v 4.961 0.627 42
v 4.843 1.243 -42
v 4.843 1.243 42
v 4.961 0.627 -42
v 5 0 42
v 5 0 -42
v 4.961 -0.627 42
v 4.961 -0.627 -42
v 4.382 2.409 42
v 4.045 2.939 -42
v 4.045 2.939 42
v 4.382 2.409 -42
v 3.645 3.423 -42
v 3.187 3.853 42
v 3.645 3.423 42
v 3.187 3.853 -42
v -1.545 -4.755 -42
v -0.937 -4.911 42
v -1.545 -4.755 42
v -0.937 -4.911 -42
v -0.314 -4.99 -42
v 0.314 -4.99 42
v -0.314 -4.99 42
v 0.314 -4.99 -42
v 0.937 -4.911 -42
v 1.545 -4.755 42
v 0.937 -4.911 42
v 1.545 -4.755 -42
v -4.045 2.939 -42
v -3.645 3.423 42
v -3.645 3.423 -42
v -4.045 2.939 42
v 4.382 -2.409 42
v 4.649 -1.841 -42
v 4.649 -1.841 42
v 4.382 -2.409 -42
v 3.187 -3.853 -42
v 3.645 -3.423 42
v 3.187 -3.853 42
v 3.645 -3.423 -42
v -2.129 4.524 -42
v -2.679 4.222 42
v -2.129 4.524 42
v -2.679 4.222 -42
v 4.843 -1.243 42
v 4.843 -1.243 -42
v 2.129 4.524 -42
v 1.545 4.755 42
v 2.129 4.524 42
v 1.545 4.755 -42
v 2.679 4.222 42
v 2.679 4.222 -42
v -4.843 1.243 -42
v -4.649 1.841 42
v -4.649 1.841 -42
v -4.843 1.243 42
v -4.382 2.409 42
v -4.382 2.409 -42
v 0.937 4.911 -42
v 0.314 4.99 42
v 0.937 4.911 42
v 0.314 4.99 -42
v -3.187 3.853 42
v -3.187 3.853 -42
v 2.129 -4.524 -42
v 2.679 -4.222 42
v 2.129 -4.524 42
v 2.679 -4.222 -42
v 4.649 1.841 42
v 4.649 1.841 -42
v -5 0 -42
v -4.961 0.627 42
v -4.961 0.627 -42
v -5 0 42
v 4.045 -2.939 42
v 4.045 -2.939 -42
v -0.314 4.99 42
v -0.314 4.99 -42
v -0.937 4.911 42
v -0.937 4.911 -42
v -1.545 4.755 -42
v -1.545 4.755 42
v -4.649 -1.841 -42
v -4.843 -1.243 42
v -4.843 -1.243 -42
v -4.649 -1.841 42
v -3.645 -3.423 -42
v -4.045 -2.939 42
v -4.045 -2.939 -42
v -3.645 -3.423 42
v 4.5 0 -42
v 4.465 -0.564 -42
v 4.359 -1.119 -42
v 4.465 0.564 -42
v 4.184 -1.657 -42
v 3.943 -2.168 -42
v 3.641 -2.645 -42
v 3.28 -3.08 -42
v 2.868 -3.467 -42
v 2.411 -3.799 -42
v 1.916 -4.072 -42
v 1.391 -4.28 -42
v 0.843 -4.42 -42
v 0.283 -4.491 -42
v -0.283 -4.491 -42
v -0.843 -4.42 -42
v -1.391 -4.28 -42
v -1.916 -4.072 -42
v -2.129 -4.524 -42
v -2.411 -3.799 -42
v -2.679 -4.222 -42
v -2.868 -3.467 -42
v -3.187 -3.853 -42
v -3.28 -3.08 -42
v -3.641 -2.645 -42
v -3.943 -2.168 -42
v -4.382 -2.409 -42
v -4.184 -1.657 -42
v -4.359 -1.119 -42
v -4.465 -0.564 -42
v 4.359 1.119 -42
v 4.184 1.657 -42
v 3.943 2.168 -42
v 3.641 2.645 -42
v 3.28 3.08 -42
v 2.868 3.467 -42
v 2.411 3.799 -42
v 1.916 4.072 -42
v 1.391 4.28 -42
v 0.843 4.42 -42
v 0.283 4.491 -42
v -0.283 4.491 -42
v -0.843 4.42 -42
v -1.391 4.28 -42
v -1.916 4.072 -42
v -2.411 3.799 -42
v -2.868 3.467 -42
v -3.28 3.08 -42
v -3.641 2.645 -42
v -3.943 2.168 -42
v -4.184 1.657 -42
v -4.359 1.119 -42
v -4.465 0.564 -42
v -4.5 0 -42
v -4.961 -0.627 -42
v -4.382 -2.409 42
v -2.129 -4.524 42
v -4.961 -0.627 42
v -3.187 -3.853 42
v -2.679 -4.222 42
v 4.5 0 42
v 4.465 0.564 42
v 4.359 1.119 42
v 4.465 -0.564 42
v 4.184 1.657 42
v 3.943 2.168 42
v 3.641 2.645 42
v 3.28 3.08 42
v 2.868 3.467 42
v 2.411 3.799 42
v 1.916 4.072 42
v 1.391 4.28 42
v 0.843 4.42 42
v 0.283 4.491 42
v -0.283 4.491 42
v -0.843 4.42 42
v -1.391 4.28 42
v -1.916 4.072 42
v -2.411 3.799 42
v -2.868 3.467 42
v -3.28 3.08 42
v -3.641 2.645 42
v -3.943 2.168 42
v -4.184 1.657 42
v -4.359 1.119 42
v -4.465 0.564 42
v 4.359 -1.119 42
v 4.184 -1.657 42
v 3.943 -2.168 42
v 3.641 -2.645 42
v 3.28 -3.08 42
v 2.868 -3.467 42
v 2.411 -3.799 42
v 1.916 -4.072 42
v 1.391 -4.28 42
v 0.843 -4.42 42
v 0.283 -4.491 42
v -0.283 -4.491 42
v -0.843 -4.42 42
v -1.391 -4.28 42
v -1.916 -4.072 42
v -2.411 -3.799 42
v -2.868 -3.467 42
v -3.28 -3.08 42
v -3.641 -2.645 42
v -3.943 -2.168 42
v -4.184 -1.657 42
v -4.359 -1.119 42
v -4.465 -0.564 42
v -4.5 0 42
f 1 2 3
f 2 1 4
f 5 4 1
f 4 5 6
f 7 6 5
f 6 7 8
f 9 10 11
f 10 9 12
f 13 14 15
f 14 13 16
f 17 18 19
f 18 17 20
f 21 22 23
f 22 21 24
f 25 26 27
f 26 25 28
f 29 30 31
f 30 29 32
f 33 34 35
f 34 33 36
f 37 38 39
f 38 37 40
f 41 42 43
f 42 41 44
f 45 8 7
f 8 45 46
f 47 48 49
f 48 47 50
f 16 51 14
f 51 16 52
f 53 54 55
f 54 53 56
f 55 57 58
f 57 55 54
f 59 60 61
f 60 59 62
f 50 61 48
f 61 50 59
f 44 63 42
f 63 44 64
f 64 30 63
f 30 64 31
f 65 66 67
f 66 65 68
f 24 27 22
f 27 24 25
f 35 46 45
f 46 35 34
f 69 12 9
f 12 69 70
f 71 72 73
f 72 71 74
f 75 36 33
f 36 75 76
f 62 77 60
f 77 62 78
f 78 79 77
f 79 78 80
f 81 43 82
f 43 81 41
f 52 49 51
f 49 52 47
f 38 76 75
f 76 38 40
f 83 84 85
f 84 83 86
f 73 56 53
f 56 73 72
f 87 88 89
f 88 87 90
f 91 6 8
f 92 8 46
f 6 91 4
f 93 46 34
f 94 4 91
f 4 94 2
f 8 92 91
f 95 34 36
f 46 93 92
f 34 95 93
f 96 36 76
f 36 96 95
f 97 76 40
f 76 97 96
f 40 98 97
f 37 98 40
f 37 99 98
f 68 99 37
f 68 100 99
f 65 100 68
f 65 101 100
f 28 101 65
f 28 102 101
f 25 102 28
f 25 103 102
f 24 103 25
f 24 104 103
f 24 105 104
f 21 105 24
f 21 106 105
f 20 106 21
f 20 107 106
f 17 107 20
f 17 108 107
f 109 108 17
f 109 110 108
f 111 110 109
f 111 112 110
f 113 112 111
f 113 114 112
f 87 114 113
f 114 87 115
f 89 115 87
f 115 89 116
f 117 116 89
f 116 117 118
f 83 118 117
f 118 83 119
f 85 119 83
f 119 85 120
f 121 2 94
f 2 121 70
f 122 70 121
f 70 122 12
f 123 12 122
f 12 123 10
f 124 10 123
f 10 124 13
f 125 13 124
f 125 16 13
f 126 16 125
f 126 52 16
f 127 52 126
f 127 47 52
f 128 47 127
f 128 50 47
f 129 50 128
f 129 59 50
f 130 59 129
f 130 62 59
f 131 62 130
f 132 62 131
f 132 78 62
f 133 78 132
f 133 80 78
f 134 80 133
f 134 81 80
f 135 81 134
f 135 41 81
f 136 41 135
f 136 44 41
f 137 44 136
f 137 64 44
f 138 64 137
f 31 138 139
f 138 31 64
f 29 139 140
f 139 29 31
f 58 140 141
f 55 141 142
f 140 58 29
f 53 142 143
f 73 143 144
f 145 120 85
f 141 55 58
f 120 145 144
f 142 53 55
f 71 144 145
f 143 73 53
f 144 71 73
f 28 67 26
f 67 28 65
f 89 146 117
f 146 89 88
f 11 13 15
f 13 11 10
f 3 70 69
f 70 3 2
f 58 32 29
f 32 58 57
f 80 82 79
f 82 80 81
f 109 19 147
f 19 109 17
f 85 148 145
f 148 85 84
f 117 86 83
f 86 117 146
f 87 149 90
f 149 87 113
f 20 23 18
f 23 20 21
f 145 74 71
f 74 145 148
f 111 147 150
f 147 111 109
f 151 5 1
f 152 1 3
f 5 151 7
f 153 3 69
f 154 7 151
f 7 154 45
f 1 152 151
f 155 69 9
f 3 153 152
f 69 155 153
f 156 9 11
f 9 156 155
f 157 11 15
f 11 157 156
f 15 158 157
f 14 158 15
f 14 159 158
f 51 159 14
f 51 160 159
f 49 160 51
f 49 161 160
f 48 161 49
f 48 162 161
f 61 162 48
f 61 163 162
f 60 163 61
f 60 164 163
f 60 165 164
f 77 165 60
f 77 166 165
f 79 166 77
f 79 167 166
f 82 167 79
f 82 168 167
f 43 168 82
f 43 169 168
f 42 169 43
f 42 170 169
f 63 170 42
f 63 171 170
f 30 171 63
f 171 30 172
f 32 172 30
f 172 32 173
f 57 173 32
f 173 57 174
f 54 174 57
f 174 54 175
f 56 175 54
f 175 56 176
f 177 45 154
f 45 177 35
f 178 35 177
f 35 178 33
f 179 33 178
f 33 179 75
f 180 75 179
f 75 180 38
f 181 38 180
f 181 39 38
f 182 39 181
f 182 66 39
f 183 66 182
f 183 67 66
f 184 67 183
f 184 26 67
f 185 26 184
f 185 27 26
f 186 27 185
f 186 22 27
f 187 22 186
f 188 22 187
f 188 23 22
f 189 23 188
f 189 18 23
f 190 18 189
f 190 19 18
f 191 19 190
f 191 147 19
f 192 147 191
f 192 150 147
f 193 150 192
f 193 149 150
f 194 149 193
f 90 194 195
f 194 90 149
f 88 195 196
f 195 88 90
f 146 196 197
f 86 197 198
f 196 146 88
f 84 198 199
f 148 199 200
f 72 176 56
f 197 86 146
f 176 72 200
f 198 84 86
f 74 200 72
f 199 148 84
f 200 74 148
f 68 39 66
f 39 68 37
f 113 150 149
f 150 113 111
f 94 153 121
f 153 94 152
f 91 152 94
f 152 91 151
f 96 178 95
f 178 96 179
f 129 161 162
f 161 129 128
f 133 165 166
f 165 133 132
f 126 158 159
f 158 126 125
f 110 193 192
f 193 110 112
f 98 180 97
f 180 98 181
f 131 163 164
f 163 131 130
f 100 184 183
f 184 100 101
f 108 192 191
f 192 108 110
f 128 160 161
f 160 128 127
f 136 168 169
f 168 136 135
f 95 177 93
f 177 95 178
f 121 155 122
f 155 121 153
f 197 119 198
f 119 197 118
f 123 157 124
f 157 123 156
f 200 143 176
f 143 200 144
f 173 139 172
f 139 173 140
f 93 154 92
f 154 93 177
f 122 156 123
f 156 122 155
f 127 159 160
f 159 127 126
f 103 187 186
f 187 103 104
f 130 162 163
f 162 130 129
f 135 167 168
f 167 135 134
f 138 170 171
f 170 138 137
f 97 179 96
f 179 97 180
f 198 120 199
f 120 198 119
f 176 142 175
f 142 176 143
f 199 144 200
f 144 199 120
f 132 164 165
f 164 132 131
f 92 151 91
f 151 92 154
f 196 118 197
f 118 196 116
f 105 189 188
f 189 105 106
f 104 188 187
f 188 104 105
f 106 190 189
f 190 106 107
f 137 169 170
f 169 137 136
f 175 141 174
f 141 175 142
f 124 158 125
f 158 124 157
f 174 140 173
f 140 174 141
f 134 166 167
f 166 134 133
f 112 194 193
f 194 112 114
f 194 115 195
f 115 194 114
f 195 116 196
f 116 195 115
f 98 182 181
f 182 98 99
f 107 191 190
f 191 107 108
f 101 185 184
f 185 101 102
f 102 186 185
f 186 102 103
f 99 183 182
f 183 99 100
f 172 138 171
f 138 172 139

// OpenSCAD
$fn = 50;


difference() {
	union() {
		translate(v = [0, 0, -42.0000000000]) {
			cylinder(h = 84, r = 5.0000000000);
		}
	}
	union() {
		translate(v = [0, 0, -100.0000000000]) {
			cylinder(h = 200, r = 4.5000000000);
		}
	}
}
